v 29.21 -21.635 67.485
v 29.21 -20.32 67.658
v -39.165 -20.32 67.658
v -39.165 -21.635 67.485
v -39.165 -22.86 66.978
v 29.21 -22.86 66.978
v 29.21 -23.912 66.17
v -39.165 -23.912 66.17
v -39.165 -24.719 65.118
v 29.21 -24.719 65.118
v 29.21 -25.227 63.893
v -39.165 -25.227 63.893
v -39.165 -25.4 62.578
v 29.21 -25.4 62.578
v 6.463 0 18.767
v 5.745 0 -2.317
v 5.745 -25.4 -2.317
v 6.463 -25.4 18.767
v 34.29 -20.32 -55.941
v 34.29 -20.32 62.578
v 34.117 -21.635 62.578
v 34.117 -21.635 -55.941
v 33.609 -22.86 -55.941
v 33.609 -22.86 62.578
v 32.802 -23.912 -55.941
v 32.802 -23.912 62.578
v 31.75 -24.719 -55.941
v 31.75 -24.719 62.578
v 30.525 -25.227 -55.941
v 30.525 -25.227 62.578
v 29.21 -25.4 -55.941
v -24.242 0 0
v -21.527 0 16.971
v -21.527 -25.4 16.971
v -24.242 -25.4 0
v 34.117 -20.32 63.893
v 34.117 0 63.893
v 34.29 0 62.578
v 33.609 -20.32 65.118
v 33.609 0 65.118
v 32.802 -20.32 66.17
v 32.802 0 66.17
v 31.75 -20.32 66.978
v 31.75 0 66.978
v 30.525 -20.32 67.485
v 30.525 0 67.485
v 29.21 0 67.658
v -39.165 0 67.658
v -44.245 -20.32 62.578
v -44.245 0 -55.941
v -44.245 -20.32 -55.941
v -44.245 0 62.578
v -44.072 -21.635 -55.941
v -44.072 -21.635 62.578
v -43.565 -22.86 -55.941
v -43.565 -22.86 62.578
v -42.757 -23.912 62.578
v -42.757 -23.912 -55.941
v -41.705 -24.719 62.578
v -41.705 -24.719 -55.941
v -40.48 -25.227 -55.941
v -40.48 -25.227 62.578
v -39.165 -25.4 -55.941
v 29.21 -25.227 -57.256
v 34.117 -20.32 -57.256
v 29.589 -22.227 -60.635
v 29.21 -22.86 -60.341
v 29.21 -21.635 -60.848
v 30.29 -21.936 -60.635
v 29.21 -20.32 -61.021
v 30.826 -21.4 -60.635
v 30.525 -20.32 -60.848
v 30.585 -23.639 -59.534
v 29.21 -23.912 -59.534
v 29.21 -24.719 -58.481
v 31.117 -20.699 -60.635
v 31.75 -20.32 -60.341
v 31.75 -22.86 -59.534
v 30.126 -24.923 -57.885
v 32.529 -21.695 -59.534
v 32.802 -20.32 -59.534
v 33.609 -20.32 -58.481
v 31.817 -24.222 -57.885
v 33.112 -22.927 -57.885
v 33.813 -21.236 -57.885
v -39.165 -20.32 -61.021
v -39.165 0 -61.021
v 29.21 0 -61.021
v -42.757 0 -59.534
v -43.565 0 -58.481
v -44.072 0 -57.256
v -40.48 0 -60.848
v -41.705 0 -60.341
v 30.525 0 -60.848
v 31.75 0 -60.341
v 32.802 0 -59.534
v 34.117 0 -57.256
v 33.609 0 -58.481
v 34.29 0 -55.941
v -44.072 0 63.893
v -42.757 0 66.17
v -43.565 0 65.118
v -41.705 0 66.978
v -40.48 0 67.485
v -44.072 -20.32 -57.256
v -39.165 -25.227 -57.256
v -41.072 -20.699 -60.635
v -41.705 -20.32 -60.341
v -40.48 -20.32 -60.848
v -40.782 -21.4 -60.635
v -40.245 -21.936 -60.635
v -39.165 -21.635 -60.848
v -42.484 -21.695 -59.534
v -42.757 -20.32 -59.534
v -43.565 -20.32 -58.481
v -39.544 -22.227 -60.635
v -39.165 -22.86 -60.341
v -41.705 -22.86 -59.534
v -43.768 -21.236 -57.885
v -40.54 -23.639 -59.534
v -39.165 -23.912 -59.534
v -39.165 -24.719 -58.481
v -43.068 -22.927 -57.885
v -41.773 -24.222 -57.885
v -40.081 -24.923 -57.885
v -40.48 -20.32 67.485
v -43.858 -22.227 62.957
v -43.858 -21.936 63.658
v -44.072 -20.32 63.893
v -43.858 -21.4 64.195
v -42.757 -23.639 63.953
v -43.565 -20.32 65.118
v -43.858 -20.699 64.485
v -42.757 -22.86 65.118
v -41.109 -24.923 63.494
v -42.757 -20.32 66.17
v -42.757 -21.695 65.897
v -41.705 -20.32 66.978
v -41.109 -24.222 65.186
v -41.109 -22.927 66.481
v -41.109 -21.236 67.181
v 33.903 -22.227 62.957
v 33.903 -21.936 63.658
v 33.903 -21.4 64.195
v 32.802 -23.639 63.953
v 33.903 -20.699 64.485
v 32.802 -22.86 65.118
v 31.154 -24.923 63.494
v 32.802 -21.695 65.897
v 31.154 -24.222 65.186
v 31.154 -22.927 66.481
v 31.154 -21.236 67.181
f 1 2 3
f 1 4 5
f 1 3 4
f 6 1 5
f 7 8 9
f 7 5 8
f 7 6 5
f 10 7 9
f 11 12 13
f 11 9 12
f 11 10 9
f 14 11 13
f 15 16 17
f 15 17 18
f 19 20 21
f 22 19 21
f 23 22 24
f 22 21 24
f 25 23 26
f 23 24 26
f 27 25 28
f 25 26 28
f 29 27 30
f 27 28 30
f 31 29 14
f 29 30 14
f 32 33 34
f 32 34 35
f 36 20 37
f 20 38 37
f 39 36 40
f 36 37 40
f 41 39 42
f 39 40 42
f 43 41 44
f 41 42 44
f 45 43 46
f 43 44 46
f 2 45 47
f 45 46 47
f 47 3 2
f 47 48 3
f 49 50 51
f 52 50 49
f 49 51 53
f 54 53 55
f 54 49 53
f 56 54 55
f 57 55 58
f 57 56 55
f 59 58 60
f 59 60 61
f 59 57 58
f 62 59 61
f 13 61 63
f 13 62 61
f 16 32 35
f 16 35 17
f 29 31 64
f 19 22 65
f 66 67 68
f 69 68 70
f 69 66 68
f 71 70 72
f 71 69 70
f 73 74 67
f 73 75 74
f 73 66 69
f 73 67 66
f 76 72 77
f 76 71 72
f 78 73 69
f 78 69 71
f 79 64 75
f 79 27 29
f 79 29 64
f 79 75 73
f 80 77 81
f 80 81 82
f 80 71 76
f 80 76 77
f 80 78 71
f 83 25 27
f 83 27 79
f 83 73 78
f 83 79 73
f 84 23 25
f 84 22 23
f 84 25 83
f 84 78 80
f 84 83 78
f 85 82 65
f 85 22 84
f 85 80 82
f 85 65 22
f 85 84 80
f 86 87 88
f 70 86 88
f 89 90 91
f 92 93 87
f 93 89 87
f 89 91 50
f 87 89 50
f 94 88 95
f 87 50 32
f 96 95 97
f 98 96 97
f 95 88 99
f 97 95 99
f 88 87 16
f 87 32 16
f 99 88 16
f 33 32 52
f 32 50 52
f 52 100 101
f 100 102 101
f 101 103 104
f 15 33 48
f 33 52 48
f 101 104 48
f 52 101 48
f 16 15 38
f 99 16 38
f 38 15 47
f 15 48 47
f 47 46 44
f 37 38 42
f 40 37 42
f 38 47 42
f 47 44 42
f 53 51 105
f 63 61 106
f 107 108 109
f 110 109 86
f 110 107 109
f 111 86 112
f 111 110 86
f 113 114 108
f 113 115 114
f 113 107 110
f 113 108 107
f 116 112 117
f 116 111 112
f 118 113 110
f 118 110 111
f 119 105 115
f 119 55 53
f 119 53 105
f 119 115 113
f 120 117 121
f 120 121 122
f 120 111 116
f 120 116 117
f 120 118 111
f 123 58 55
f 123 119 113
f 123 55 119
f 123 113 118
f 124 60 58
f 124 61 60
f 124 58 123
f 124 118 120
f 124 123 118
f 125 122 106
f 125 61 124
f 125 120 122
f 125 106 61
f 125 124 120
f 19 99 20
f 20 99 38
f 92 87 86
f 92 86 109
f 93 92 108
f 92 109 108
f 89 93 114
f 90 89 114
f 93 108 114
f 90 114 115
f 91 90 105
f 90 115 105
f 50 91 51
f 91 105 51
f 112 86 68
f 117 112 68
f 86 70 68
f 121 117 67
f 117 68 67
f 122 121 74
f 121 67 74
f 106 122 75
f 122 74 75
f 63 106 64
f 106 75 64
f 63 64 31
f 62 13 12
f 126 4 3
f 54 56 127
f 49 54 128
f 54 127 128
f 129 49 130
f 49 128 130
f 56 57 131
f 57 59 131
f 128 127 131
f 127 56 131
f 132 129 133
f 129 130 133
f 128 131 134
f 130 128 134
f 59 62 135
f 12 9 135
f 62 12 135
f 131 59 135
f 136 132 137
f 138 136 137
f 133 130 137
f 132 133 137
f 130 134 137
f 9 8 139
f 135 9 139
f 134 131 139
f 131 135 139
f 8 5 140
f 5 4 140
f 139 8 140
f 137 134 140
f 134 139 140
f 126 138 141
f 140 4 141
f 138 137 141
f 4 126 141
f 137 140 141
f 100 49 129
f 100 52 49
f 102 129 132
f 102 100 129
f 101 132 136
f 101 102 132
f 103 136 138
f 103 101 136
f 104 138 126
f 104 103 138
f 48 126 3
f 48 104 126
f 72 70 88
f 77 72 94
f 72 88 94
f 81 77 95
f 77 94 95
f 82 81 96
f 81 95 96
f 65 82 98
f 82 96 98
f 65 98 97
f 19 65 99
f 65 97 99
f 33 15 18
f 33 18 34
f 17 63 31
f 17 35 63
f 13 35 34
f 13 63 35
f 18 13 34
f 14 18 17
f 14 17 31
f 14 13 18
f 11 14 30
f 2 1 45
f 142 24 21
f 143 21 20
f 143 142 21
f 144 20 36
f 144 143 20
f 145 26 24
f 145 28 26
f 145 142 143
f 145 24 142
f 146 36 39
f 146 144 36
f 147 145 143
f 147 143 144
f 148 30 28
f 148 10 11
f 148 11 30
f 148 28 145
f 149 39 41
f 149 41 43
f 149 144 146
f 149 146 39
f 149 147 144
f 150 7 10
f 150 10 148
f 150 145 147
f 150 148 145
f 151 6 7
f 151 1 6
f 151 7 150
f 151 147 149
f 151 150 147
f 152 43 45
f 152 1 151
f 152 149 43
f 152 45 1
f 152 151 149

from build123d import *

# Parameters (mm, degrees)
F0_W     = 78.535166
F0_H     = 128.679674
F1_DEPTH = 25.4
F2_R     = 5.08
F3_R     = 5.08
F4_R     = 5.08
F5_R     = 5.08
F6_T     = -2819.4
F8_DEPTH = 25.4


with BuildPart() as f1:
    # F0 (on Front) → F1 (new body)
    with BuildSketch(Plane.XZ):
        with Locations((-4.977578, 3.318386)):
            Rectangle(F0_W, F0_H)
    extrude(amount=F1_DEPTH)

    # F2
    f2_edges = [f1.edges().sort_by_distance(p)[0] for p in [
        (-4.977578, -25.4, 67.658223),
    ]]
    fillet(f2_edges, radius=F2_R)

    # F3
    f3_edges = [f1.edges().sort_by_distance(p)[0] for p in [
        (-44.245161, -25.4, 0.778386),
    ]]
    fillet(f3_edges, radius=F3_R)

    # F4
    f4_edges = [f1.edges().sort_by_distance(p)[0] for p in [
        (34.290005, -25.4, 0.778386),
    ]]
    fillet(f4_edges, radius=F4_R)

    # F5
    f5_edges = [f1.edges().sort_by_distance(p)[0] for p in [
        (-4.977578, -25.4, -61.021451),
    ]]
    fillet(f5_edges, radius=F5_R)

    # F6
    f6_openings = [f1.faces().sort_by_distance(p)[0] for p in [
        (-4.977578, -25.4, 3.318386),
    ]]
    offset(amount=F6_T, openings=f6_openings)

    # F7 (on Front) → F8 (cut)
    with BuildSketch(Plane.XZ):
        Polygon((5.745283, -2.317451), (6.463282, 18.76704), (-21.526827, 16.971201), (-24.241816, 0), align=None)
    extrude(amount=F8_DEPTH, mode=Mode.SUBTRACT)


solid = f1.part
